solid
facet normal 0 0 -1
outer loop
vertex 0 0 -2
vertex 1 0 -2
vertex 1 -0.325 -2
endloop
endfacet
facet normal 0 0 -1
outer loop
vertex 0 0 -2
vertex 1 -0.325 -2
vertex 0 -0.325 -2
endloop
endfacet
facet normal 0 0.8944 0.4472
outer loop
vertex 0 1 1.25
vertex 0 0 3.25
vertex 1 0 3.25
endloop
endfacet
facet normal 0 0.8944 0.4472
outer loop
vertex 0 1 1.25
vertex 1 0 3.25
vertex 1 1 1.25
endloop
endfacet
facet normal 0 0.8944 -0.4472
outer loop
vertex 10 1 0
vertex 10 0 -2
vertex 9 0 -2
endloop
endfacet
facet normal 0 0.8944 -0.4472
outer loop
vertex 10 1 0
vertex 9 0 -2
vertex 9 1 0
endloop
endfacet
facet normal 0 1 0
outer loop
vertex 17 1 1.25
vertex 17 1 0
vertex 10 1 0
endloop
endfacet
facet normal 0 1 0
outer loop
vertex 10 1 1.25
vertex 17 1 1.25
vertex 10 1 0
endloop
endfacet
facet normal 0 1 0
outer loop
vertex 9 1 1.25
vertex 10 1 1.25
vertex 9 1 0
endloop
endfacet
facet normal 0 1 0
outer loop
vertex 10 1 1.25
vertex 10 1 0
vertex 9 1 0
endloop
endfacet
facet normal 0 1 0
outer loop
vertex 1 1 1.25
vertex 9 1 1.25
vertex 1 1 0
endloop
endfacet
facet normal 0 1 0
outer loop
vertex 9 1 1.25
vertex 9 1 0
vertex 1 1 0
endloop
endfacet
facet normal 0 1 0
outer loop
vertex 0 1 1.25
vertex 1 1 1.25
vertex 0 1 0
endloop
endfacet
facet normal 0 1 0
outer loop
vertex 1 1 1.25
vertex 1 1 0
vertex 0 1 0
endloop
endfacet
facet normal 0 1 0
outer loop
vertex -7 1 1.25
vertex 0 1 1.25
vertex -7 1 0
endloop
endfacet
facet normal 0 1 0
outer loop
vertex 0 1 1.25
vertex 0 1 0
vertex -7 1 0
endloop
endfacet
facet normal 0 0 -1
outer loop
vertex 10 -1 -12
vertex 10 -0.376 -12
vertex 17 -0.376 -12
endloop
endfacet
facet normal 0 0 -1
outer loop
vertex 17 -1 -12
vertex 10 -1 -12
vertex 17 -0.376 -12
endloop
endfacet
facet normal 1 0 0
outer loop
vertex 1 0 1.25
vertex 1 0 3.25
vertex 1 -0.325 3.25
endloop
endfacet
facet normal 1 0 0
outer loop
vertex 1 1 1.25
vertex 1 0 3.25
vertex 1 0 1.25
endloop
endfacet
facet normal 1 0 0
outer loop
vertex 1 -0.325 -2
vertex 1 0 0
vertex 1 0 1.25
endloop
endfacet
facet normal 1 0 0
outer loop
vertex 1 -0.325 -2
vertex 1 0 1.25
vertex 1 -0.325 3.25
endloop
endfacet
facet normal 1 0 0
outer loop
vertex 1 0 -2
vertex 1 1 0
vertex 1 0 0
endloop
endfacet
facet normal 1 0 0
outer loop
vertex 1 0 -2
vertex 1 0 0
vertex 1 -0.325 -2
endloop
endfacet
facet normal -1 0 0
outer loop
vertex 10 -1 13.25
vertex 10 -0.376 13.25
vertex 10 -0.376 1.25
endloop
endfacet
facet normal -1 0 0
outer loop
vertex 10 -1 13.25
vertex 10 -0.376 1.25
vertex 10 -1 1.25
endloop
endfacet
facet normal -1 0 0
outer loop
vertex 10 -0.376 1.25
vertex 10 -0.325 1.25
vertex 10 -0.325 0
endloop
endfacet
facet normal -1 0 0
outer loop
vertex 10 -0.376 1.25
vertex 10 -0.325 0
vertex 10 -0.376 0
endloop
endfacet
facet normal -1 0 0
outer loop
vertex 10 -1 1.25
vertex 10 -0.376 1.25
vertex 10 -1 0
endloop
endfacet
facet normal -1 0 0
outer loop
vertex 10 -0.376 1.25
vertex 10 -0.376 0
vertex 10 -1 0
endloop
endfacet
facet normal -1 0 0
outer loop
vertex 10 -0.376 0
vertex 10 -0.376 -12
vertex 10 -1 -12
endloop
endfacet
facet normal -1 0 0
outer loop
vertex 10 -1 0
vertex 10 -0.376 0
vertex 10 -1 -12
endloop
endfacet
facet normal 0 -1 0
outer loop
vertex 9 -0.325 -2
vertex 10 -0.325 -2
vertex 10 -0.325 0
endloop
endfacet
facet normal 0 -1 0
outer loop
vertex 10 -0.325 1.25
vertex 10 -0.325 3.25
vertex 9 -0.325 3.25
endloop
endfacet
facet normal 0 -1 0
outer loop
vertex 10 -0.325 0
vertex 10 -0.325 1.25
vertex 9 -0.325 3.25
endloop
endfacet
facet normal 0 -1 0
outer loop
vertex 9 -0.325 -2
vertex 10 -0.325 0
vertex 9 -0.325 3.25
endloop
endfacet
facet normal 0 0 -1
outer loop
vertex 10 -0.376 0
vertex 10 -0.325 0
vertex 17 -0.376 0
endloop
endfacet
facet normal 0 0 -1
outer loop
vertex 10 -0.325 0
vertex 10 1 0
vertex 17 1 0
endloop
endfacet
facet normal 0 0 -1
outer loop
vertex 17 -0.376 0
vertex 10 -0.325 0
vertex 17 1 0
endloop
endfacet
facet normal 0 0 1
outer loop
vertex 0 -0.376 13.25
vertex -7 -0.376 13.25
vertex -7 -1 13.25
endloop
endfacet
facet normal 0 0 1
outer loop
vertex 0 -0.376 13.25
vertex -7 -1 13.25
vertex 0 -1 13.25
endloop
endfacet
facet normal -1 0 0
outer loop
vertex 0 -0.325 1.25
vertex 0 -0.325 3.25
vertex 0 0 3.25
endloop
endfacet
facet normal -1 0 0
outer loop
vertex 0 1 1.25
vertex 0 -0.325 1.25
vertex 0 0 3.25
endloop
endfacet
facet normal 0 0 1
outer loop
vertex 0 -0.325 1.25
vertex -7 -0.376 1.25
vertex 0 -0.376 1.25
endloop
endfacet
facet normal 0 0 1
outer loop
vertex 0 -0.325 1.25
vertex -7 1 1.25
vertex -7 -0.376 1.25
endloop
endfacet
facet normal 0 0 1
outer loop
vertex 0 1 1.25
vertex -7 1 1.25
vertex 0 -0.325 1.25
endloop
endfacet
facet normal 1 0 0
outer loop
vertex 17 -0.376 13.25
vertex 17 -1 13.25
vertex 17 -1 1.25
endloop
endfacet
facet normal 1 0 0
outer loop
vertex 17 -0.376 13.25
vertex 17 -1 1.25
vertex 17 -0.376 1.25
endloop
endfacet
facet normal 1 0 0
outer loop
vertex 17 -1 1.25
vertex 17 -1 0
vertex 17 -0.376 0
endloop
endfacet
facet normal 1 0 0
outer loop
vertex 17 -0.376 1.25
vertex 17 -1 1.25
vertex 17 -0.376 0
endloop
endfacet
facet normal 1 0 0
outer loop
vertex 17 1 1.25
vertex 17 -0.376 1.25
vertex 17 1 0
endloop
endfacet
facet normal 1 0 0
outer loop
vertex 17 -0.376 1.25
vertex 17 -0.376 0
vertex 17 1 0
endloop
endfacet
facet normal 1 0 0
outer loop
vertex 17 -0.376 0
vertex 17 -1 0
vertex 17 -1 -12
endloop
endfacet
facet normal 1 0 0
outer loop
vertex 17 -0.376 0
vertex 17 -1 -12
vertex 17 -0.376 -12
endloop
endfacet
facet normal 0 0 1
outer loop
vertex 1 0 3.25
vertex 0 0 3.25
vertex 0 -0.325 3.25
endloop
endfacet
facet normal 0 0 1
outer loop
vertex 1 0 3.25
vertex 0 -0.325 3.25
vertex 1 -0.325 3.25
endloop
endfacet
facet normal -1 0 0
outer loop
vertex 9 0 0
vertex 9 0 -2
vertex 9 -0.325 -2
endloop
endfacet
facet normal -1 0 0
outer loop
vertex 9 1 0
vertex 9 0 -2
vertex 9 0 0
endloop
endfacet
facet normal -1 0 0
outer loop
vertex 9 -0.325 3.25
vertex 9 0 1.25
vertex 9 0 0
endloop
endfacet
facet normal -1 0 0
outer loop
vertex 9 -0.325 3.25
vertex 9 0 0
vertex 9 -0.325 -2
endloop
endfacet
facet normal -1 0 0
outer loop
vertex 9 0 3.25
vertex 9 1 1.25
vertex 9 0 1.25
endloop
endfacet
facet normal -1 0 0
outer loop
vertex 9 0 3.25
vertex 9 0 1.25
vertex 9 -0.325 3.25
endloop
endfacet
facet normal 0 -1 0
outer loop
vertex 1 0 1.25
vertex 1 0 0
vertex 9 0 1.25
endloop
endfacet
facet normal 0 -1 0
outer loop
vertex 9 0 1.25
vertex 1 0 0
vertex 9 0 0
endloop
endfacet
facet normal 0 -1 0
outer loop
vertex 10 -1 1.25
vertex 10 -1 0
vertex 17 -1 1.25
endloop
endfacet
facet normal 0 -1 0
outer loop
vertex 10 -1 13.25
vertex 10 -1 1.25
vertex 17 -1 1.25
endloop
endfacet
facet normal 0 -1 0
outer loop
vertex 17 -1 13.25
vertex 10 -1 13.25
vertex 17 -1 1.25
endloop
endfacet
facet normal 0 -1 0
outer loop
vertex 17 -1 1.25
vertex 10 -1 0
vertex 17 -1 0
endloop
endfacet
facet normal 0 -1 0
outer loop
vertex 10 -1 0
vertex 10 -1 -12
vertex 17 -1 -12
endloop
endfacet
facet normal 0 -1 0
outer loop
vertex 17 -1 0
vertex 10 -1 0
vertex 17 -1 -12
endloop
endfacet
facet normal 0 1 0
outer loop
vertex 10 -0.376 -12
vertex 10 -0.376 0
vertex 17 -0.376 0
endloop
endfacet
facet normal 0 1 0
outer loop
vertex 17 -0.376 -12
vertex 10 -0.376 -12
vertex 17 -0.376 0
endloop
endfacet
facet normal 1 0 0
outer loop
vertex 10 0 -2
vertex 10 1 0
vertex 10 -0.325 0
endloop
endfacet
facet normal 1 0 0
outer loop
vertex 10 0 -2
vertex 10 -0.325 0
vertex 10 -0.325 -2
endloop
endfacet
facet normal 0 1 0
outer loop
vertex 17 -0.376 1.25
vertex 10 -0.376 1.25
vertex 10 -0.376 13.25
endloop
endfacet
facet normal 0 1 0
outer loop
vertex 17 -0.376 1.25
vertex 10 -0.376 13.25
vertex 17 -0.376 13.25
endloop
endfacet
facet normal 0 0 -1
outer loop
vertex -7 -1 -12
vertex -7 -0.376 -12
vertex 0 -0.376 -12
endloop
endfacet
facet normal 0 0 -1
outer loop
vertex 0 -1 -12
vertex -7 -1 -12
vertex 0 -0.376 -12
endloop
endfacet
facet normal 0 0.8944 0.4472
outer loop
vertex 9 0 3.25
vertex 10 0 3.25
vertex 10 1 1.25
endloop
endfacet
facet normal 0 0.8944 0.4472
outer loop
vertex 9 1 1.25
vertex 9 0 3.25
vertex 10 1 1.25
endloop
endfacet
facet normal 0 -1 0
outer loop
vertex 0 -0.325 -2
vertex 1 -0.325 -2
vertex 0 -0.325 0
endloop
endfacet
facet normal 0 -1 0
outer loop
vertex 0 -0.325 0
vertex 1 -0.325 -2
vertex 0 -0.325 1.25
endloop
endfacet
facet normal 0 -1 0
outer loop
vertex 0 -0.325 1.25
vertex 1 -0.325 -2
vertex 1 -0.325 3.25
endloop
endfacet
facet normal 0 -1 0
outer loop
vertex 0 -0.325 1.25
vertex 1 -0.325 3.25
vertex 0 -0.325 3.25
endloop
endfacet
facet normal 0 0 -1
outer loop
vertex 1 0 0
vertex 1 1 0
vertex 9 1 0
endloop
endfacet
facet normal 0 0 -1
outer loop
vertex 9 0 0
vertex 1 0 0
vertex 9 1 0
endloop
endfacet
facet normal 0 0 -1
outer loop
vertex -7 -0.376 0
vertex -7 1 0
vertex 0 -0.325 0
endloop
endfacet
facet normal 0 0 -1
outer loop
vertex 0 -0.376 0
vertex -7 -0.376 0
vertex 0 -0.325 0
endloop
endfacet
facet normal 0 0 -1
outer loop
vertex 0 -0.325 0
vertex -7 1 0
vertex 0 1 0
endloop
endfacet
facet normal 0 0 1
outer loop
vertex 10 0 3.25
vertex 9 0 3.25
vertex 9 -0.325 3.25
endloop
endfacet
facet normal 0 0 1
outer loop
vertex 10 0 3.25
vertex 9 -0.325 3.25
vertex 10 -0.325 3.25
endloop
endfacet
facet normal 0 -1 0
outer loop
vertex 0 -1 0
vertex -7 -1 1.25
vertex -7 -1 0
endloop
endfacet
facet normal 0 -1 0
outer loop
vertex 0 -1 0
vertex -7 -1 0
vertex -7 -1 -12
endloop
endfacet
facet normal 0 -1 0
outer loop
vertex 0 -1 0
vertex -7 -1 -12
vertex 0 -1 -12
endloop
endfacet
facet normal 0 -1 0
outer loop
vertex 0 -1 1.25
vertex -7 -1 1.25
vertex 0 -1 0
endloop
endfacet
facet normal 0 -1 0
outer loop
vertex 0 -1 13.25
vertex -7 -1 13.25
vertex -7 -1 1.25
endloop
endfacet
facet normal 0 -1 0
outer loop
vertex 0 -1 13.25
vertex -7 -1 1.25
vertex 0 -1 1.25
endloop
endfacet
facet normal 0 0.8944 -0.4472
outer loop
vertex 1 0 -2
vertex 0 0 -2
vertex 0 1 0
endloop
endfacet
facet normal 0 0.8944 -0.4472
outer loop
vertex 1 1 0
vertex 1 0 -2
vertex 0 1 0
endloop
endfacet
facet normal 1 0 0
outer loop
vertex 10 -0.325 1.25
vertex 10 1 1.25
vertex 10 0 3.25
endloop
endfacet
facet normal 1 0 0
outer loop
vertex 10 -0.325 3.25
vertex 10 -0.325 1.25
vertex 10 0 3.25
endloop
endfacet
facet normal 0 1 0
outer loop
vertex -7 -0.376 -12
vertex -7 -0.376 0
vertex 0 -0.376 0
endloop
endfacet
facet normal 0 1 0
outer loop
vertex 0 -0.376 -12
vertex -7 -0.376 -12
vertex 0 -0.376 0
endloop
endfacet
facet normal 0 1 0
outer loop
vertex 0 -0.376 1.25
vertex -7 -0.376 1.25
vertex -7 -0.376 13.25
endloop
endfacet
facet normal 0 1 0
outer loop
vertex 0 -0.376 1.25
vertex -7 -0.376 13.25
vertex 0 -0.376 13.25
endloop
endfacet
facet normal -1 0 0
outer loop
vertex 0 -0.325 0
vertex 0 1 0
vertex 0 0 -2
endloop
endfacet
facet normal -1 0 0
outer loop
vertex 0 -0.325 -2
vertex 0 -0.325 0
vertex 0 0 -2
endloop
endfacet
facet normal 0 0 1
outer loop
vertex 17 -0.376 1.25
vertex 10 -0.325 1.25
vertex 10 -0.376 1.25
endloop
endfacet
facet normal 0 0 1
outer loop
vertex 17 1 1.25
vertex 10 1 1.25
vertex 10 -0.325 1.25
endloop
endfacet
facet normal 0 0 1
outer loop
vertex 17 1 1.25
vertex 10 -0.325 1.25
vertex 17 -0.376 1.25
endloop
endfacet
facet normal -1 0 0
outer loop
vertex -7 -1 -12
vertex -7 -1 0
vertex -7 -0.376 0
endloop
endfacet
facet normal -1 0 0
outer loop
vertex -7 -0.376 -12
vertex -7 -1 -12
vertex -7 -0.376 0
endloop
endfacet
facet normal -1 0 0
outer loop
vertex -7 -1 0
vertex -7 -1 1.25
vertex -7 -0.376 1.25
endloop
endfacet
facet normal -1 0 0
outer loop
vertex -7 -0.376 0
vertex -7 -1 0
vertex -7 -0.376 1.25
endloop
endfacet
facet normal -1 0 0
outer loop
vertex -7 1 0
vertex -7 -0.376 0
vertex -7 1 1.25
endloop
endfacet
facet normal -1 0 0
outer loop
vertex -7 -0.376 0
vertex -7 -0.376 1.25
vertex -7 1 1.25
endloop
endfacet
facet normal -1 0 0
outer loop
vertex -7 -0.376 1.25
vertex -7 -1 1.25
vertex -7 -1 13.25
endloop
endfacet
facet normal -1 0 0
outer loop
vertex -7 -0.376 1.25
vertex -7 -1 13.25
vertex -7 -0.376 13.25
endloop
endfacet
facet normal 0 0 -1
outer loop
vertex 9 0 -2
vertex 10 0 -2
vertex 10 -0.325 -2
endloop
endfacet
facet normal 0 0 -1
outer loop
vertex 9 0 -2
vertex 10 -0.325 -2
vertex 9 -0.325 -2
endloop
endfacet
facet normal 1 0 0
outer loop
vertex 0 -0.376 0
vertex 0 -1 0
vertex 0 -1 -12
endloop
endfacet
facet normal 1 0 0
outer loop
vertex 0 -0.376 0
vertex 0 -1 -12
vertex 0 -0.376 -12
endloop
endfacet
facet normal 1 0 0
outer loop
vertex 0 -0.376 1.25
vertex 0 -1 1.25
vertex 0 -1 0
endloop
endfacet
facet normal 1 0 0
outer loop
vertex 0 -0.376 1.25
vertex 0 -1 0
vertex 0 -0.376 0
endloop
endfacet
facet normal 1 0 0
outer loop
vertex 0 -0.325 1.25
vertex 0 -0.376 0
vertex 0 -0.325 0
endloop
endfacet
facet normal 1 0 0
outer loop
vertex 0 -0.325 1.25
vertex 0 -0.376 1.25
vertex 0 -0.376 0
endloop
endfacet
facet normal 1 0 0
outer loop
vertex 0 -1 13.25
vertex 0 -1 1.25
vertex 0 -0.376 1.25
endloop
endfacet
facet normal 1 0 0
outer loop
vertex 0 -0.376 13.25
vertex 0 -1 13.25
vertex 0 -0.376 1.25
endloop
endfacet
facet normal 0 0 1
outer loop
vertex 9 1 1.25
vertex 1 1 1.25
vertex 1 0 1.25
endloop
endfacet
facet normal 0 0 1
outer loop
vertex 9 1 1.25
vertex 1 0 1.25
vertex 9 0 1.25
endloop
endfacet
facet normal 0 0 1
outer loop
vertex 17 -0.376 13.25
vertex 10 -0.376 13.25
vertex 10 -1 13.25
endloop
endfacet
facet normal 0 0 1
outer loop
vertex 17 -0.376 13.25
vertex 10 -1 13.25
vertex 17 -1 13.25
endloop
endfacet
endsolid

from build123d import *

# Parameters (mm, degrees)
BOSS_EXTRUDE1_DEPTH      = 1.25
SKETCH2_W                = 1
SKETCH2_H                = 0.325
BOSS_EXTRUDE2_DEPTH      = 2
SKETCH3_W                = 1
SKETCH3_H                = 0.325
BOSS_EXTRUDE3_DEPTH      = 2
BOSS_EXTRUDE7_DEPTH      = 1
BOSS_EXTRUDE8_DEPTH      = 1
SKETCH9_W                = 7
SKETCH9_H                = 0.624150965
BOSS_EXTRUDE9_DEPTH      = 12
BOSS_EXTRUDE9_DEPTH_BACK = 13.25


with BuildPart() as part:
    # Sketch1 → Boss-Extrude1 (new body)
    with BuildSketch(Plane.XY):
        Polygon((1, 0), (9, 0), (9, -0.325), (10, -0.325), (10, -1), (17, -1), (17, 1), (10, 1), (0, 1), (-7, 1), (-7, -1), (0, -1), (0, -0.325), (1, -0.325), align=None)
    extrude(amount=BOSS_EXTRUDE1_DEPTH)

    # Sketch2 → Boss-Extrude2 (add)
    with BuildSketch(Plane.XY.offset(1.25)):
        with Locations((0.5, -0.1625)):
            Rectangle(SKETCH2_W, SKETCH2_H)
        with Locations((9.5, -0.1625)):
            Rectangle(SKETCH2_W, SKETCH2_H)
    extrude(amount=BOSS_EXTRUDE2_DEPTH)

    # Sketch3 → Boss-Extrude3 (add)
    with BuildSketch(Plane(origin=(0, 0, 0), x_dir=(-1, 0, 0), z_dir=(0, 0, -1))):
        with Locations((-9.5, -0.1625)):
            Rectangle(SKETCH3_W, SKETCH3_H)
        with Locations((-0.5, -0.1625)):
            Rectangle(SKETCH3_W, SKETCH3_H)
    extrude(amount=BOSS_EXTRUDE3_DEPTH)

    # Sketch7 → Boss-Extrude7 (add)
    with BuildSketch(Plane(origin=(10, 0, 0), x_dir=(0, 0, -1), z_dir=(1, 0, 0))):
        Polygon((-3.25, 0), (-1.25, 1), (-1.25, 0), (-1.25, -0.325), (-3.25, -0.325), align=None)
        Polygon((2, 0), (0, 1), (0, 0), align=None)
    extrude(amount=-BOSS_EXTRUDE7_DEPTH)

    # Sketch8 → Boss-Extrude8 (add)
    with BuildSketch(Plane.ZY):
        Polygon((-2, 0), (0, 1), (0, 0), align=None)
        Polygon((1.25, 1), (1.25, 0), (3.25, 0), align=None)
    extrude(amount=-BOSS_EXTRUDE8_DEPTH)

    # Sketch9 → Boss-Extrude9 (add, two sides)
    with BuildSketch(Plane.XY.offset(1.25)) as boss_extrude9_sk:
        with Locations((-3.5, -0.687924517)):
            Rectangle(SKETCH9_W, SKETCH9_H)
        with Locations((13.5, -0.687924517)):
            Rectangle(SKETCH9_W, SKETCH9_H)
    extrude(amount=BOSS_EXTRUDE9_DEPTH)
    extrude(boss_extrude9_sk.sketch, amount=-BOSS_EXTRUDE9_DEPTH_BACK)


solid = part.part
